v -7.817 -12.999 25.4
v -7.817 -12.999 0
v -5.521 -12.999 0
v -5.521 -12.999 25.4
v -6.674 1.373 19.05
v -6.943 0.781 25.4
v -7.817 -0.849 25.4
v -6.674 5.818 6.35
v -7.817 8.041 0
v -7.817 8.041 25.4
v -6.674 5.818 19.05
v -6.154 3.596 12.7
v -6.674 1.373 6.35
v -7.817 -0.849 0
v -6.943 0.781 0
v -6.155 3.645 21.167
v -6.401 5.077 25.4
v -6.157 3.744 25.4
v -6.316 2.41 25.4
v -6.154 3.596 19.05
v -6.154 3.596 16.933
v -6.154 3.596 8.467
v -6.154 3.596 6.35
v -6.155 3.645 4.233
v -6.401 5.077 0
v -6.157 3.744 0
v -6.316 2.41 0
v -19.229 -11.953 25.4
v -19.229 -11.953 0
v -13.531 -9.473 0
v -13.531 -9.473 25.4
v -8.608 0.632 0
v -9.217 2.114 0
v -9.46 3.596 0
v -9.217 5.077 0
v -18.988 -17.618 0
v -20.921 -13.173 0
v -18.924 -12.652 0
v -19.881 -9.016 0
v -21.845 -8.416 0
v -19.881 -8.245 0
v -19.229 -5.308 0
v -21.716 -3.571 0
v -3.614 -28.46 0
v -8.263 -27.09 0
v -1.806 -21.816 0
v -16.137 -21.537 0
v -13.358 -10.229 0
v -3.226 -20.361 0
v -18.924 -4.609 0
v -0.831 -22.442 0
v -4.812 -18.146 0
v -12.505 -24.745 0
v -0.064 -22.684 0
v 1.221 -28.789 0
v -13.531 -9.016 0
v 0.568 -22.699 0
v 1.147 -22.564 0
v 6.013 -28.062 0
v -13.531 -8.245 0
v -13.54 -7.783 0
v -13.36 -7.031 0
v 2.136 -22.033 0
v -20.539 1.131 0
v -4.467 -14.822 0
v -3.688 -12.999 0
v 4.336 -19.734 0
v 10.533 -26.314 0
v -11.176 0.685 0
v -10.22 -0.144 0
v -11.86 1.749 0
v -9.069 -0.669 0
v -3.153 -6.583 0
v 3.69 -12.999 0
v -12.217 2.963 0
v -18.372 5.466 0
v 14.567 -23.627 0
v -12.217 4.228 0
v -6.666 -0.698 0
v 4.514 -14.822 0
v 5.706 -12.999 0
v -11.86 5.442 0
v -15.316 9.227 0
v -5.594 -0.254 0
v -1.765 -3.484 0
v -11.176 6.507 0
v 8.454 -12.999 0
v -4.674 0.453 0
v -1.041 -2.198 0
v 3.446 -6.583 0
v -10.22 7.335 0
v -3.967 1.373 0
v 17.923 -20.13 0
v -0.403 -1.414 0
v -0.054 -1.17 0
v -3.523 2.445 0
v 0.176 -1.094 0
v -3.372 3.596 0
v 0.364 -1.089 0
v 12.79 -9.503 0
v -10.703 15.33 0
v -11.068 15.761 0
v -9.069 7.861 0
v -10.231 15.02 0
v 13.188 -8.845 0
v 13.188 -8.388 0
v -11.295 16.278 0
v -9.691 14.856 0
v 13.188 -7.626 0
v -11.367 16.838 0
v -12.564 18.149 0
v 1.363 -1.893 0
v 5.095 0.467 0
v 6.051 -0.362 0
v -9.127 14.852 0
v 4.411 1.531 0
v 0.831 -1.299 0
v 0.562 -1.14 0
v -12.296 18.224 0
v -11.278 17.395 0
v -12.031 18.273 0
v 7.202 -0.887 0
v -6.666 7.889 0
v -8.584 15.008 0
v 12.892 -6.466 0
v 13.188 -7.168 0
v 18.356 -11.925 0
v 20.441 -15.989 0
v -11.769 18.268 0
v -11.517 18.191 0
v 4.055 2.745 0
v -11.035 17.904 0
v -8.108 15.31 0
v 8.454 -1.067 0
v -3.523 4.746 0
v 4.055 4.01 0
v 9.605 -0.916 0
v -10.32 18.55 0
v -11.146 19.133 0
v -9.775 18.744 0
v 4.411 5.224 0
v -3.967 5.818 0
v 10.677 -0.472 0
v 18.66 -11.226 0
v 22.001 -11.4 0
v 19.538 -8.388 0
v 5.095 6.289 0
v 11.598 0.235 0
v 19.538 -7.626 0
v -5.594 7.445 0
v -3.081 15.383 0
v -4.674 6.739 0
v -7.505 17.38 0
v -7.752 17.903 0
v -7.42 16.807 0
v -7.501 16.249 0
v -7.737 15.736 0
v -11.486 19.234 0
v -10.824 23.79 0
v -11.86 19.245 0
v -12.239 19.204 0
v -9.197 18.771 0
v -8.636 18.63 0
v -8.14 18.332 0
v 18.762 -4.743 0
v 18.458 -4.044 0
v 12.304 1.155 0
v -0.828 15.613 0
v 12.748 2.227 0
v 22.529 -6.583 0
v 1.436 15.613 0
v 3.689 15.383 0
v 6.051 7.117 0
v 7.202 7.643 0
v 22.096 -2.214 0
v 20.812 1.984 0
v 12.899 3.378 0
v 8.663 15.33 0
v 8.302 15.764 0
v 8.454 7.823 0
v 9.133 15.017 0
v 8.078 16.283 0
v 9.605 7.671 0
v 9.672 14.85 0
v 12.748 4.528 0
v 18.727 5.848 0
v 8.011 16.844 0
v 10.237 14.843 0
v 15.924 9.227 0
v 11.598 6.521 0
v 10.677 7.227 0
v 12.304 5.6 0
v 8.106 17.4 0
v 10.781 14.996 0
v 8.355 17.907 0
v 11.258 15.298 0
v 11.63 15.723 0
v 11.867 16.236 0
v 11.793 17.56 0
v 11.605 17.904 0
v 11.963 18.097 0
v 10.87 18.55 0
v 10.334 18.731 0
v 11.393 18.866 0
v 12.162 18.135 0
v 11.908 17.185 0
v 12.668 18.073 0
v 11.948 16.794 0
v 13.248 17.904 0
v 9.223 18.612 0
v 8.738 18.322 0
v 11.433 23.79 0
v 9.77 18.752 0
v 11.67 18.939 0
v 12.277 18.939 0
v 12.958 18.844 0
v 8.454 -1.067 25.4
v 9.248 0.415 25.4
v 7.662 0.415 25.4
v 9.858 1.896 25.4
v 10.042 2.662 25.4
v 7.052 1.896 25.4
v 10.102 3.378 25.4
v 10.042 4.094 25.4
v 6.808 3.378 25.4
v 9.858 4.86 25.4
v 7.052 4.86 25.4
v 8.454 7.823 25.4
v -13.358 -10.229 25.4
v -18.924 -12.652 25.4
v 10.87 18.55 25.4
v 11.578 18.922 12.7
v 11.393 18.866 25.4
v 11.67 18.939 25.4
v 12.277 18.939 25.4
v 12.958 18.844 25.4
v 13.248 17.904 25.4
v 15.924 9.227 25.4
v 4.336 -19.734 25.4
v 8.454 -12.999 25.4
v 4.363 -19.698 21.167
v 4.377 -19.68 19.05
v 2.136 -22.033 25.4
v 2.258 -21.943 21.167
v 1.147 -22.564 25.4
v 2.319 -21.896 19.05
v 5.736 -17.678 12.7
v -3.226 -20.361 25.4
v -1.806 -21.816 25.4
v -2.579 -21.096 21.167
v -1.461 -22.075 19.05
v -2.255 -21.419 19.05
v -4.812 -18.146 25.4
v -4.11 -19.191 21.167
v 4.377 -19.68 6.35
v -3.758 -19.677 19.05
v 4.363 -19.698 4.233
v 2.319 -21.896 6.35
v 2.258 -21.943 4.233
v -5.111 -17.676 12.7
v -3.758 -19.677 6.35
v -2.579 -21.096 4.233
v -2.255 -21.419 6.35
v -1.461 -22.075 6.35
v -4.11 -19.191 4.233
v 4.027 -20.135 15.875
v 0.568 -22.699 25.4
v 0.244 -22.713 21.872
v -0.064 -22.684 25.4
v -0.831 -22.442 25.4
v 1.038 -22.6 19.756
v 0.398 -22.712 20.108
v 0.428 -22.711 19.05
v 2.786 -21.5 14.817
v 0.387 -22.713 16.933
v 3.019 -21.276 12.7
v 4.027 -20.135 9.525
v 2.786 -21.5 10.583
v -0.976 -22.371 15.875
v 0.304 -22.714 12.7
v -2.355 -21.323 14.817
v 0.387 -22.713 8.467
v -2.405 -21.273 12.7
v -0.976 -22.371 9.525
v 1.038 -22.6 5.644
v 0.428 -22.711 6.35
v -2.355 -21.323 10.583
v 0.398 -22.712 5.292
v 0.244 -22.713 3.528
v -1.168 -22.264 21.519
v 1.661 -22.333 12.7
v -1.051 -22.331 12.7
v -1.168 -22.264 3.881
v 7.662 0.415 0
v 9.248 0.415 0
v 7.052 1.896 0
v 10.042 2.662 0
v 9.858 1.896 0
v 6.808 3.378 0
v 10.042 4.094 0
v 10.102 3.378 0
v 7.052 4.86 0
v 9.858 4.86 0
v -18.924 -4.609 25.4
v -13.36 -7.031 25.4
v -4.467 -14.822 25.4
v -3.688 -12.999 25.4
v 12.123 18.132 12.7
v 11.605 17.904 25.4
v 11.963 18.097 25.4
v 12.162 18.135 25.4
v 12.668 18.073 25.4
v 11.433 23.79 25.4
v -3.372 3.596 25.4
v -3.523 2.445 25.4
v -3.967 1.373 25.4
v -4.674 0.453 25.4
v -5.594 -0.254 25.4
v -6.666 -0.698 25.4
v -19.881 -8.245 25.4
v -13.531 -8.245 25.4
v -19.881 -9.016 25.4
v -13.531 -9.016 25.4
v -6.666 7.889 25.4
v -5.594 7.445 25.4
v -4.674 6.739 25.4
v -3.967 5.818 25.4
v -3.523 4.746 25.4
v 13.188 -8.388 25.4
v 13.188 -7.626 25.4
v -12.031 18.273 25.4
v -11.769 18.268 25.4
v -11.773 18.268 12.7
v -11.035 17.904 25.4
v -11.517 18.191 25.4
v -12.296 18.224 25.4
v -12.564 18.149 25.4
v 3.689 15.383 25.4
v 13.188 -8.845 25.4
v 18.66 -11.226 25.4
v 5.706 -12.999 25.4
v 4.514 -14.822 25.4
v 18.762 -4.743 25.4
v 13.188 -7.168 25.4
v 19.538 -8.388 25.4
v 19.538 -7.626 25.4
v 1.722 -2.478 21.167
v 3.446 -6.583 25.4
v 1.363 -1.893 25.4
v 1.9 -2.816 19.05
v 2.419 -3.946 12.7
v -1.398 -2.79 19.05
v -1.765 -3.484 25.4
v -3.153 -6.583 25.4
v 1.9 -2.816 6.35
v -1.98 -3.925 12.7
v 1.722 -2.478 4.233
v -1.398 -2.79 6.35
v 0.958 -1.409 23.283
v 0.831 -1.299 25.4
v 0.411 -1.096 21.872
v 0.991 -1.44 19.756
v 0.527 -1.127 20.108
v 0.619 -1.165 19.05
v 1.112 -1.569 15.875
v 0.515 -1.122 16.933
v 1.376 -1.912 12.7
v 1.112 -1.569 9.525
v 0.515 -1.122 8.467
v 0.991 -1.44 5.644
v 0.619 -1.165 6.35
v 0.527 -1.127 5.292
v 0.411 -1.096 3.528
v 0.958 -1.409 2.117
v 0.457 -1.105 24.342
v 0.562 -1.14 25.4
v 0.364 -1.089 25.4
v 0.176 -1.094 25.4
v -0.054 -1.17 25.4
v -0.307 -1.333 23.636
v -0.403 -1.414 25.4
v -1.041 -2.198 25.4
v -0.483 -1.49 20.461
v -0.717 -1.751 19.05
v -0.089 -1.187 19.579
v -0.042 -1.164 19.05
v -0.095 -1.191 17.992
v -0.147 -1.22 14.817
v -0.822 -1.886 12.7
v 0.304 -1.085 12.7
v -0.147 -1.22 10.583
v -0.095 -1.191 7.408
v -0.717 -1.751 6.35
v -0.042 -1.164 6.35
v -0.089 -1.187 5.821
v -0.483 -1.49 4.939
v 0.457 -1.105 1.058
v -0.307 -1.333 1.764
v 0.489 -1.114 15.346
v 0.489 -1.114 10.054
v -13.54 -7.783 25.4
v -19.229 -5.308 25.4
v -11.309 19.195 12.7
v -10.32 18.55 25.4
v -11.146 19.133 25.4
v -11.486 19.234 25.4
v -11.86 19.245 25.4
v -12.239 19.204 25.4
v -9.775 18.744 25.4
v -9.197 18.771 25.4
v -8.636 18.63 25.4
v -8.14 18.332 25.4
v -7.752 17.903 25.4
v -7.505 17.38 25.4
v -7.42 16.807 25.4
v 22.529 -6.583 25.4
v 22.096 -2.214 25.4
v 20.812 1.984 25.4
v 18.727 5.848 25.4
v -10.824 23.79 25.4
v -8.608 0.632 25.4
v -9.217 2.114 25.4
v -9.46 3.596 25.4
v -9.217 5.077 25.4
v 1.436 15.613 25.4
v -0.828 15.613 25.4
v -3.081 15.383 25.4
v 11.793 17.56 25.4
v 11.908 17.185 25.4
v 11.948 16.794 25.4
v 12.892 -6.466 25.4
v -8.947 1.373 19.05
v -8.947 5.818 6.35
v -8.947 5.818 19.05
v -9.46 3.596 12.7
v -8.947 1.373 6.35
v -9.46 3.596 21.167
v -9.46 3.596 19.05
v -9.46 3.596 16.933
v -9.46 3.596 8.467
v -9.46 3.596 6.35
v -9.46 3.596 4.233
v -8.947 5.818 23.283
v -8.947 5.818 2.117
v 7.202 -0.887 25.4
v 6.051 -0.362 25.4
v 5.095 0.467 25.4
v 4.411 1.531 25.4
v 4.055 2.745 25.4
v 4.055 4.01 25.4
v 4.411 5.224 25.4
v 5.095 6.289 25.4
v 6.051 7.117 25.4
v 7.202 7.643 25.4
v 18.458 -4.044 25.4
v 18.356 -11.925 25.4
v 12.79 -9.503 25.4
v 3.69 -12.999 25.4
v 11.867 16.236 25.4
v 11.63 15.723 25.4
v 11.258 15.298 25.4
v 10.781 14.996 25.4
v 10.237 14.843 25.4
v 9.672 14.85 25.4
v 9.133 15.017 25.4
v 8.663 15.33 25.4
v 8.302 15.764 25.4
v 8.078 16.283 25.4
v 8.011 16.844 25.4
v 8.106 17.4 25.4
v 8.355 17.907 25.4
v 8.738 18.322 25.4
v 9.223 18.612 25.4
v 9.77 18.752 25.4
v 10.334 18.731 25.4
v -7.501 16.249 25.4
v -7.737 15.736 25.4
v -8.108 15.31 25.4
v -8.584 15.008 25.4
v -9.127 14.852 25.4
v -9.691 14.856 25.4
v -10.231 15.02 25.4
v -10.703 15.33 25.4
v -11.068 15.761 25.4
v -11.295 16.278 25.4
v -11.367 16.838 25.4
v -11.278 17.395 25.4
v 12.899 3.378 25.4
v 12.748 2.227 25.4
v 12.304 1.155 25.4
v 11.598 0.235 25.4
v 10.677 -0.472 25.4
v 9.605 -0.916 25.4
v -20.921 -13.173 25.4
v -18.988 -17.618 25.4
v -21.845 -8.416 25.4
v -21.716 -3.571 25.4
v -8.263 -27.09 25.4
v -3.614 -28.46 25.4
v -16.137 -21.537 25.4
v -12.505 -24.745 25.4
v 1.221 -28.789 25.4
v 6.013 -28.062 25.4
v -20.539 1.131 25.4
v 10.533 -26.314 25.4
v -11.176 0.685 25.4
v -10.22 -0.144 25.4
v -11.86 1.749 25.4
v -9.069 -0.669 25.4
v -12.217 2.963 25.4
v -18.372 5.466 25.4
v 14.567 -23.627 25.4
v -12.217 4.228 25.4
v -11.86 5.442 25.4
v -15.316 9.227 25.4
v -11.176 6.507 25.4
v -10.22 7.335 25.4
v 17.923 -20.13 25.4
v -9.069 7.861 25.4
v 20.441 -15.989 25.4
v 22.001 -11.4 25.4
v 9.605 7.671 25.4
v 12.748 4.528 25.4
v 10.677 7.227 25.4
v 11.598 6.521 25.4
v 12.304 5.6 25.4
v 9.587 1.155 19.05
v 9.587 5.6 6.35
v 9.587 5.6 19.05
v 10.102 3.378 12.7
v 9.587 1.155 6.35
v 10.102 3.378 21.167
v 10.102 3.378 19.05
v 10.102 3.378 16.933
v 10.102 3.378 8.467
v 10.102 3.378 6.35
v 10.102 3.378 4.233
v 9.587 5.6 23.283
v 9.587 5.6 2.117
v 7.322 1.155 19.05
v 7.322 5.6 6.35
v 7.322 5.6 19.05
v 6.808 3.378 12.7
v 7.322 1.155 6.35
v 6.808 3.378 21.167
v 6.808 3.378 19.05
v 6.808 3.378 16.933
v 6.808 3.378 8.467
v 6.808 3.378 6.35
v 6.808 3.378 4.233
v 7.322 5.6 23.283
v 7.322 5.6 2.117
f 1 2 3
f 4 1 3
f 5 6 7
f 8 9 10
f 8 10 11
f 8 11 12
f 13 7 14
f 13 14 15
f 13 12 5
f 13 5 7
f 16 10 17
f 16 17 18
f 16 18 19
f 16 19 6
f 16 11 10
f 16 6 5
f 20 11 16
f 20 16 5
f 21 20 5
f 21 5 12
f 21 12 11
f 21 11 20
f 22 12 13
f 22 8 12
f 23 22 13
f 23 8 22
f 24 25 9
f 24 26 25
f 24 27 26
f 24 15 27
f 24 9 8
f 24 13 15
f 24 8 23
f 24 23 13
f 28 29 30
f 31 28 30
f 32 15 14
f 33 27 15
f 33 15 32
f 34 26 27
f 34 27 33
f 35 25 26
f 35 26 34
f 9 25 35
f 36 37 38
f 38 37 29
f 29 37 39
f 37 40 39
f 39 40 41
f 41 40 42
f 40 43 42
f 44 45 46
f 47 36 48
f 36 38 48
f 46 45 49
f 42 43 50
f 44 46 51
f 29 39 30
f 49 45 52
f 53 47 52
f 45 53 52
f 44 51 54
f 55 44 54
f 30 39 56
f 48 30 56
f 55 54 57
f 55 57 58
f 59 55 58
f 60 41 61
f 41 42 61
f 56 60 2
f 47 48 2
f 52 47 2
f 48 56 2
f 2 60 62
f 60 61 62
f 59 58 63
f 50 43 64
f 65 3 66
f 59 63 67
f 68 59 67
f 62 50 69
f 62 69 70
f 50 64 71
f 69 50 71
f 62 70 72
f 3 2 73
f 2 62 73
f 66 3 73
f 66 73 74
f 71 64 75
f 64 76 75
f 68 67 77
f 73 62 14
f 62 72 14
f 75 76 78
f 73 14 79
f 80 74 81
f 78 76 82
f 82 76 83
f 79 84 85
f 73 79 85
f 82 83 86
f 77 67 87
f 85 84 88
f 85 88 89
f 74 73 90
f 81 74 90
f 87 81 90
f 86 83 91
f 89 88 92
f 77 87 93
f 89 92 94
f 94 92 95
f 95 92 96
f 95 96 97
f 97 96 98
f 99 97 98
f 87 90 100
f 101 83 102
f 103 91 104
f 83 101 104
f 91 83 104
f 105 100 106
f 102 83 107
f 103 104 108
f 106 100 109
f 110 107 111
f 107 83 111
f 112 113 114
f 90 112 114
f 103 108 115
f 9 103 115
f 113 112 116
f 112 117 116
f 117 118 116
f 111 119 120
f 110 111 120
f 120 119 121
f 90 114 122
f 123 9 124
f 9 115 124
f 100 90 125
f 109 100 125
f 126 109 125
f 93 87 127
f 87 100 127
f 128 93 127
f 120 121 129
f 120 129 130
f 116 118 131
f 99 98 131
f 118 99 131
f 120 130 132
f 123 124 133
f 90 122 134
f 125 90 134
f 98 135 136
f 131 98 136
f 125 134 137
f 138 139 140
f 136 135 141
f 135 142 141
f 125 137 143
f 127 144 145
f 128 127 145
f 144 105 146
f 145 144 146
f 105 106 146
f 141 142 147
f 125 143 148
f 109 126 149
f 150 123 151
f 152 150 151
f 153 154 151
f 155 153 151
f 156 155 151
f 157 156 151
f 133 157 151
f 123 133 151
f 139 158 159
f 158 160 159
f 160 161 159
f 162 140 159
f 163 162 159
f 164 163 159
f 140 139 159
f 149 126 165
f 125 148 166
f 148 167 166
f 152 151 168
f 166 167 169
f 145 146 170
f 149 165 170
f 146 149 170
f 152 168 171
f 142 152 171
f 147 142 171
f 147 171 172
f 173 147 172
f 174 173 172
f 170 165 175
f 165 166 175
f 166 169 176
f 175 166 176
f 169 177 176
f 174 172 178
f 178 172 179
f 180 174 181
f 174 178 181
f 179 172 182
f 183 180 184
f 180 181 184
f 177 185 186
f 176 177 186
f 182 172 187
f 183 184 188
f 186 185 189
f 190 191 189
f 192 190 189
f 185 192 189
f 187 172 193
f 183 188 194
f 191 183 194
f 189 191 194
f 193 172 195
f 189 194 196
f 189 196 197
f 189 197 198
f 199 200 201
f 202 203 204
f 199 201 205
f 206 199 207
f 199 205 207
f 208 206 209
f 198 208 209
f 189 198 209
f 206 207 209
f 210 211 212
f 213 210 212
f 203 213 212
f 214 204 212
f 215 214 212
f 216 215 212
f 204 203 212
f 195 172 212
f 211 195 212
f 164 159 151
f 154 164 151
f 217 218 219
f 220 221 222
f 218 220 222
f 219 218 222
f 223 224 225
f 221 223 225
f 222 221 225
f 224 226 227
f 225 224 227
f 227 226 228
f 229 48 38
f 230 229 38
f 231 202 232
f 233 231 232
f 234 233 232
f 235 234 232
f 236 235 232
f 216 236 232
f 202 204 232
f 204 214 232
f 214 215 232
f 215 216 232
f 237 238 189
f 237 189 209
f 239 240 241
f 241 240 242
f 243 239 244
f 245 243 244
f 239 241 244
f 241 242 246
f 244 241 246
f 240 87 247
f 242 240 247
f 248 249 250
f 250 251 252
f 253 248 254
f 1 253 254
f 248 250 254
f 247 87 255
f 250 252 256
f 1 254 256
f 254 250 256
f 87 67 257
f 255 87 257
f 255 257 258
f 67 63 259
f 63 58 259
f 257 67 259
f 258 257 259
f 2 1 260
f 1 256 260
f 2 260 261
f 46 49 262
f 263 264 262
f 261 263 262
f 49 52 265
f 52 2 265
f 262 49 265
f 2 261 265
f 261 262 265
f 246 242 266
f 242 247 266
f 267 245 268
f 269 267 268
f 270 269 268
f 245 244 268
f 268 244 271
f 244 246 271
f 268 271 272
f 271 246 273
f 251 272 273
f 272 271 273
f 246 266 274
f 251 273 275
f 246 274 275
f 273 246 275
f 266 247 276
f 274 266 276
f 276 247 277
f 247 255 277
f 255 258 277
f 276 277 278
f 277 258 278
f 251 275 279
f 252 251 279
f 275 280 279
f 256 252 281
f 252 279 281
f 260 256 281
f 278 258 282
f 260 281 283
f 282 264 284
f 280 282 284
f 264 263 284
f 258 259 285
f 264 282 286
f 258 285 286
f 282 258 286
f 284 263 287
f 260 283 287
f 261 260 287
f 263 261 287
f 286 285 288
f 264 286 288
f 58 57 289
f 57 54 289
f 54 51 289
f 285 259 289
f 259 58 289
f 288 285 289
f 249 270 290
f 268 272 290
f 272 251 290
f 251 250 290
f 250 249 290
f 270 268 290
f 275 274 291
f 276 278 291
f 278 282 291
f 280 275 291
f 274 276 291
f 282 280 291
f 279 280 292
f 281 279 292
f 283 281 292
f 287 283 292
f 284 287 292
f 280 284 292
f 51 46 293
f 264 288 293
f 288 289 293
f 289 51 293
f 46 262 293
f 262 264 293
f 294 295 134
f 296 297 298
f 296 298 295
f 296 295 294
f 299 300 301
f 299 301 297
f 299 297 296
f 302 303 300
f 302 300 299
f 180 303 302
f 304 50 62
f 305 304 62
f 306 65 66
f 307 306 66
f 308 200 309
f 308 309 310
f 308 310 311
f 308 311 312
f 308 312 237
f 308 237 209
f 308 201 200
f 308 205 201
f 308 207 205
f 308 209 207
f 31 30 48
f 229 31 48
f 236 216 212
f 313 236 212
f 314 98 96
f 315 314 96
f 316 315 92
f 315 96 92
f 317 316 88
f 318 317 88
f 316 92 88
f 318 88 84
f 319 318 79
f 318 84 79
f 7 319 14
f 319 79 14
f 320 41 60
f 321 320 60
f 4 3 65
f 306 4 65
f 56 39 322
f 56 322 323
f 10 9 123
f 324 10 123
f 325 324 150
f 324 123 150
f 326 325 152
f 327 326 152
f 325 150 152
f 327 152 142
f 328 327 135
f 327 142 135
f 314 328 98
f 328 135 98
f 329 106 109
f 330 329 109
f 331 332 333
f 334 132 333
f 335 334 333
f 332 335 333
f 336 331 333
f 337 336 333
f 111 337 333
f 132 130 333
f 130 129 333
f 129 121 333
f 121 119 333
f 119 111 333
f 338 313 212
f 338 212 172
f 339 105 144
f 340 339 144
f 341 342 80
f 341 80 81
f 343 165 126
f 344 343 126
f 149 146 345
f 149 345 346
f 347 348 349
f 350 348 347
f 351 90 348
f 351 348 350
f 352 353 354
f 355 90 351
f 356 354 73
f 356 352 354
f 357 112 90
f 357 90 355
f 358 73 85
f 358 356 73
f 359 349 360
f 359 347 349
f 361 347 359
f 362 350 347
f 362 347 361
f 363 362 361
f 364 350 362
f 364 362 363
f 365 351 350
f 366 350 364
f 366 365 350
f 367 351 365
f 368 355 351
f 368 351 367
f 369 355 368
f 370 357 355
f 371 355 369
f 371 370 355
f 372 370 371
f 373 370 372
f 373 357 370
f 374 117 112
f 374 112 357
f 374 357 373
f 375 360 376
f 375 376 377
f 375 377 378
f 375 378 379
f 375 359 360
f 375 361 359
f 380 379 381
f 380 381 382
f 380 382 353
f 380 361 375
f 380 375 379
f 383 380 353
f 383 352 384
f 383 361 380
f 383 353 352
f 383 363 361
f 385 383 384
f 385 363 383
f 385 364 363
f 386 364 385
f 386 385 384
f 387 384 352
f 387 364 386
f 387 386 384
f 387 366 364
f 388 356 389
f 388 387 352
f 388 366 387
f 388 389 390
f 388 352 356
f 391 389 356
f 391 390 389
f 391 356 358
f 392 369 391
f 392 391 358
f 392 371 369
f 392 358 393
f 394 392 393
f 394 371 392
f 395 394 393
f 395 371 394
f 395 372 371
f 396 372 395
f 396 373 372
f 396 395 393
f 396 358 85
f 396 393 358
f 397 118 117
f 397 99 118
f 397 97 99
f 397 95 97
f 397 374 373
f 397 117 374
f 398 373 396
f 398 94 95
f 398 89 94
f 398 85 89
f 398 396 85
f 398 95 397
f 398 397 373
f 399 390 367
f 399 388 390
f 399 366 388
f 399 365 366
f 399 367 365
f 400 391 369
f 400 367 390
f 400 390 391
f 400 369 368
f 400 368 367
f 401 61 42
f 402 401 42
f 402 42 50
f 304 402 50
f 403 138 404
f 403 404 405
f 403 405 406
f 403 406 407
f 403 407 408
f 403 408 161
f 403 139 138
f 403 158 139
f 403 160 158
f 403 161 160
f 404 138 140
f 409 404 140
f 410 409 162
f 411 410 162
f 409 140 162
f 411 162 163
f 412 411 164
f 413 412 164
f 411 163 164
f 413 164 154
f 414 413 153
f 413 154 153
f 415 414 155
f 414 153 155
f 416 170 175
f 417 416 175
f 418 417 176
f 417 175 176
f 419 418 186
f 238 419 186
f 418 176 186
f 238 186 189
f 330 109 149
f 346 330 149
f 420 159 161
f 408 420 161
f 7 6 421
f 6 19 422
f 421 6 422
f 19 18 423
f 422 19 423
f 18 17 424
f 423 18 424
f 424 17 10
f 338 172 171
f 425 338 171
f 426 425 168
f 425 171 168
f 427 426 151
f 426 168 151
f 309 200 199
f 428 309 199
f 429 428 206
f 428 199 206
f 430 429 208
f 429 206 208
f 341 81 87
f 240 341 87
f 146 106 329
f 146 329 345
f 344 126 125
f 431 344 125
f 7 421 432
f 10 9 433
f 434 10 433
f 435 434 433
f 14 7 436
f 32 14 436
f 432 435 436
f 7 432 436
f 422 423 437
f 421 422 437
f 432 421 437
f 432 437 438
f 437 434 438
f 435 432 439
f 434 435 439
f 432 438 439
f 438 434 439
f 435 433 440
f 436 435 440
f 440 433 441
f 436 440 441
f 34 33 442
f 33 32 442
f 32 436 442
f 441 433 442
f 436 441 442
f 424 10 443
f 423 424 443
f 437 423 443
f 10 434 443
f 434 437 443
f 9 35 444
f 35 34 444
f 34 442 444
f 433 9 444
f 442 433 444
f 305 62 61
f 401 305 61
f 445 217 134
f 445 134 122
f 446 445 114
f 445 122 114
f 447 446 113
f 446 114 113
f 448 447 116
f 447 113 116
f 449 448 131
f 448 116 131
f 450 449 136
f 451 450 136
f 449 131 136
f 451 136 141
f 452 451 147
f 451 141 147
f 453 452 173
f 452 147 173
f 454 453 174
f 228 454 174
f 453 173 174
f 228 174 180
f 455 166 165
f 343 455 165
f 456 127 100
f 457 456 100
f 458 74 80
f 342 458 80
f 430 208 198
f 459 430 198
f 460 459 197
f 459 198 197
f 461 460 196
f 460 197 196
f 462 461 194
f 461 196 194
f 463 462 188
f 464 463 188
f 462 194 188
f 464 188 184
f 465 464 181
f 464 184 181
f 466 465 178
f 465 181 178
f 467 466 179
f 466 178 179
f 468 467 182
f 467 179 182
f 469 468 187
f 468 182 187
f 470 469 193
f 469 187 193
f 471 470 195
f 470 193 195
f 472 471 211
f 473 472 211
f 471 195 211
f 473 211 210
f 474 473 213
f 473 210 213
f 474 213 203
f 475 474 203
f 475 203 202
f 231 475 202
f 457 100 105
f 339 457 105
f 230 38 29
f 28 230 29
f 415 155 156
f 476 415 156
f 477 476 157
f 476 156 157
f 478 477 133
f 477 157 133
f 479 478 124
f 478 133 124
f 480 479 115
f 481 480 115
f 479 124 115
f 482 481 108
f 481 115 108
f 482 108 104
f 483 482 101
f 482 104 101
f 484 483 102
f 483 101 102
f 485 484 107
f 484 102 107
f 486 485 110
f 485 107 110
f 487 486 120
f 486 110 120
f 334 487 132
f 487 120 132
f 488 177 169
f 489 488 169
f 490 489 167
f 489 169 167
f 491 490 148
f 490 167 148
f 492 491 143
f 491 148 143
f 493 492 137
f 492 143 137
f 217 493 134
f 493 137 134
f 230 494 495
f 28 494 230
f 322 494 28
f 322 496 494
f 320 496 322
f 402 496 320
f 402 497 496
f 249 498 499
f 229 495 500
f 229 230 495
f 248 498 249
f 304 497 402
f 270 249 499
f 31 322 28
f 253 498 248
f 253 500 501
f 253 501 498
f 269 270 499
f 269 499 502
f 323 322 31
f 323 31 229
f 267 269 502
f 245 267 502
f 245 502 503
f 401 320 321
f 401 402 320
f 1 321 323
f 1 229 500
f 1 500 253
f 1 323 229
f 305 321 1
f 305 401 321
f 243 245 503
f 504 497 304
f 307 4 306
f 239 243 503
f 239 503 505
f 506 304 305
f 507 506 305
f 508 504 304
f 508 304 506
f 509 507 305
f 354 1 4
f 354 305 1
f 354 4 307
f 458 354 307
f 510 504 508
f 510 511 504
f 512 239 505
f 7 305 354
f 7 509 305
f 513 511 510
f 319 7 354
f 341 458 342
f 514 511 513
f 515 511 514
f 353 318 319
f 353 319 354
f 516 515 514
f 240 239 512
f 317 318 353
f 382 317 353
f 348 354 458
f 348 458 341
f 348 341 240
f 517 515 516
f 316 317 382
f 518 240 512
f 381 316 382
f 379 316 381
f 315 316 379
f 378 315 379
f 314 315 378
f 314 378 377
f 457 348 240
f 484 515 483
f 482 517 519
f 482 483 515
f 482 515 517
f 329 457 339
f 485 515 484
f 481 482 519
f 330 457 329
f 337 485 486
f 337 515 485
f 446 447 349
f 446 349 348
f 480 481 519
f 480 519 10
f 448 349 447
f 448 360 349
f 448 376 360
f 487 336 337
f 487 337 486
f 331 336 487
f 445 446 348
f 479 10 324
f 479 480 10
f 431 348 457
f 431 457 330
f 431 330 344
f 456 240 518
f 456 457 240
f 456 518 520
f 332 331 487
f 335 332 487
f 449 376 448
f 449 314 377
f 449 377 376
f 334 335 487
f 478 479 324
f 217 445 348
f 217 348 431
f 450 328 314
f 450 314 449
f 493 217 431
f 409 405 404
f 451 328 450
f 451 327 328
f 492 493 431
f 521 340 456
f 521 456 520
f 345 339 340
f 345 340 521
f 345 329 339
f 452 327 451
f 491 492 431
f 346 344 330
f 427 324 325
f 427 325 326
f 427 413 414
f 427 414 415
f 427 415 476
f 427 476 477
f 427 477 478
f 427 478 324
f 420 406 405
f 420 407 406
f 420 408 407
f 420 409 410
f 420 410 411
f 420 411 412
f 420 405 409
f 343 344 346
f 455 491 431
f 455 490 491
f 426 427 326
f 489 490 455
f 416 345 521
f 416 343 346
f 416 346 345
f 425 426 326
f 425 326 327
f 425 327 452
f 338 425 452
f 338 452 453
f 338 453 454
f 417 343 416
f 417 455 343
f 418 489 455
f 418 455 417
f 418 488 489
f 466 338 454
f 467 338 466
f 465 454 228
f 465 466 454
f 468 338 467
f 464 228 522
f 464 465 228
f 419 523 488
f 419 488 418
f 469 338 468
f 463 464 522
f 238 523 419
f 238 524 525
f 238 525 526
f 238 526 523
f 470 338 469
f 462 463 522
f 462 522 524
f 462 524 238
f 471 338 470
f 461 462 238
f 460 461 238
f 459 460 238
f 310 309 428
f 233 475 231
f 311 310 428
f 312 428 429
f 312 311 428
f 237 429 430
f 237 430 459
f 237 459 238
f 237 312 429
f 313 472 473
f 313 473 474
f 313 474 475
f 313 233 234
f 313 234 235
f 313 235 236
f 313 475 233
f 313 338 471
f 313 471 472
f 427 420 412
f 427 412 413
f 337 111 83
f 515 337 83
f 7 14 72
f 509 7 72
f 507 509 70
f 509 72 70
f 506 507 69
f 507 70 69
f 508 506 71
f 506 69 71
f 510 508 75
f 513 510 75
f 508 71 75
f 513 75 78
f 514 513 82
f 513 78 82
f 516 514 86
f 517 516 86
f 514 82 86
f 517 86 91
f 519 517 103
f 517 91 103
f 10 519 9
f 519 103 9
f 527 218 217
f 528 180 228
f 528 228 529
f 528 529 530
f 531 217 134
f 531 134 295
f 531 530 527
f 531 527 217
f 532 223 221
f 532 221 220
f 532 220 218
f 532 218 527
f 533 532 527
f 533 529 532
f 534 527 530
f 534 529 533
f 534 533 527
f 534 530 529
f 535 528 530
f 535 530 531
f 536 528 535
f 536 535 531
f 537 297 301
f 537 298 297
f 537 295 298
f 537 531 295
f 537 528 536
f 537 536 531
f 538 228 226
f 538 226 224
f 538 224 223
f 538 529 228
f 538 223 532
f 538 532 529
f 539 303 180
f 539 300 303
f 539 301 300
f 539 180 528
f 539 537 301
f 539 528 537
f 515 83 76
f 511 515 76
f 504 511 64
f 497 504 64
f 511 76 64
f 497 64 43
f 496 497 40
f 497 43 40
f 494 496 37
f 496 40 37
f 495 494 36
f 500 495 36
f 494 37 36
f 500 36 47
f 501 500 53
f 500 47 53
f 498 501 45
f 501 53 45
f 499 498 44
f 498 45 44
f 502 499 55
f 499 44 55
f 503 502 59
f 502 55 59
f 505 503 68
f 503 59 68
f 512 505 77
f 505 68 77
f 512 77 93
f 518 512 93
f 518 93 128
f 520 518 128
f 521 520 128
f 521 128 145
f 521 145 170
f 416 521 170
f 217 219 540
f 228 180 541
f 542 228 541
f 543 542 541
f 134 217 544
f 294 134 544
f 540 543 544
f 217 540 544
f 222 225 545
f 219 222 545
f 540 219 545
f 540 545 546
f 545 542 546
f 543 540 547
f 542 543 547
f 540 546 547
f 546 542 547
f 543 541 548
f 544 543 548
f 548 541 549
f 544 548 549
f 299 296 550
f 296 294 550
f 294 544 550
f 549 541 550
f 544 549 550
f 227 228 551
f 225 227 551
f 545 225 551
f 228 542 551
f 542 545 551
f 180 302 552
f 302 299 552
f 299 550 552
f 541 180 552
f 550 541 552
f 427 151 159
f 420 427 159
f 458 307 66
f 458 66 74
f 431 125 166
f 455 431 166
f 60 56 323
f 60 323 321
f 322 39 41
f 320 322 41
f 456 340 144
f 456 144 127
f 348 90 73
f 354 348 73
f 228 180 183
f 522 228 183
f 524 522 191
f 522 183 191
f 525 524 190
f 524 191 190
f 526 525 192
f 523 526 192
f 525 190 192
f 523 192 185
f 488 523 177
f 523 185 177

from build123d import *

# Parameters (mm, degrees)
F0_W     = 6.35
F0_H     = 0.7715476677
F0_H_2   = 0.762
F1_DEPTH = 25.4


with BuildPart() as f1:
    # F0 (on Top) → F1 (new body)
    with BuildSketch(Plane.XY):
        with BuildLine():
            ThreePointArc((3.6893544979, 15.3829226228), (10.2928229209, 13.271137937), (15.92431222, 9.2274072279))
            Line((15.92431222, 9.2274072279), (13.2480858126, 17.904334579))
            add(Edge.make_bspline(
                [(11.6048627637, 17.904334579), (11.759038205, 18.0069718661), (12.1326583039, 18.2556972989), (12.8353575143, 18.0343451232), (13.2480858126, 17.904334579)],
                knots=[0, 0, 0, 0, 0.4126529642, 1, 1, 1, 1], degree=3))
            ThreePointArc((11.6048627637, 17.904334579), (11.8599641167, 17.3752399796), (11.947598812, 16.7944319601))
            ThreePointArc((11.947598812, 16.7944319601), (8.3016366544, 15.7643285867), (10.8695058886, 18.5500422494))
            add(Edge.make_bspline(
                [(10.8695058886, 18.5500422494), (11.0812401289, 18.7052749618), (11.5711304706, 19.064437497), (12.455904644, 18.9238167328), (12.9582728554, 18.8439733061)],
                knots=[0, 0, 0, 0, 0.4322074192, 1, 1, 1, 1], degree=3))
            Line((12.9582728554, 18.8439733061), (11.4326283679, 23.7904555412))
            Line((11.4326283679, 23.7904555412), (3.6893544979, 15.3829226228))
        make_face()
        with BuildLine():
            Line((-12.564187943, 18.1494181327), (-15.316005519, 9.2274072279))
            ThreePointArc((-15.316005519, 9.2274072279), (-9.6845162199, 13.271137937), (-3.0810477969, 15.3829226228))
            Line((-3.0810477969, 15.3829226228), (-10.8243216669, 23.7904555412))
            Line((-10.8243216669, 23.7904555412), (-12.2388683659, 19.2041772995))
            add(Edge.make_bspline(
                [(-10.320267483, 18.5500422494), (-10.6450402853, 18.8216017136), (-11.2573678049, 19.3320321307), (-11.9249159549, 19.2452425689), (-12.2388683659, 19.2041772995)],
                knots=[0, 0, 0, 0, 0.5298854267, 1, 1, 1, 1], degree=3))
            ThreePointArc((-10.320267483, 18.5500422494), (-8.3773722381, 18.4989668664), (-7.4203719968, 16.8073400855))
            ThreePointArc((-7.4203719968, 16.8073400855), (-9.9671672086, 14.9188250457), (-11.0345882749, 17.904334579))
            add(Edge.make_bspline(
                [(-11.0345882749, 17.904334579), (-11.2746678219, 18.0659172243), (-11.7533192818, 18.388514969), (-12.2951988679, 18.2285634232), (-12.564187943, 18.1494181327)],
                knots=[0, 0, 0, 0, 0.503481537, 1, 1, 1, 1], degree=3))
        make_face()
        with BuildLine():
            ThreePointArc((-15.316005519, 9.2274072279), (-8.2630105363, -27.0901773082), (22.5291533505, -6.5827560189))
            ThreePointArc((22.5291533505, -6.5827560189), (20.8115746398, 1.9844078679), (15.92431222, 9.2274072279))
            ThreePointArc((15.92431222, 9.2274072279), (10.2928229209, 13.271137937), (3.6893544979, 15.3829226228))
            ThreePointArc((3.6893544979, 15.3829226228), (0.3041533505, 15.6422439811), (-3.0810477969, 15.3829226228))
            ThreePointArc((-3.0810477969, 15.3829226228), (-9.6845162199, 13.271137937), (-15.316005519, 9.2274072279))
        make_face()
        Polygon((-19.2285237709, -11.9529337805), (-13.530993307, -9.4734483975), (-13.3581133165, -10.2292431305), (-18.9244574609, -12.6516380664), align=None, mode=Mode.SUBTRACT)
        with Locations((-16.705993307, -8.6304745637)):
            Rectangle(F0_W, F0_H, mode=Mode.SUBTRACT)
        Polygon((-13.3601024399, -7.0305023596), (-13.5401906446, -7.7831600793), (-19.2285237709, -5.3076818185), (-18.9244579329, -4.6089773272), align=None, mode=Mode.SUBTRACT)
        with BuildLine():
            add(Edge.make_bspline(
                [(8.4544904778, -12.9991904411), (5.7358208401, -17.8578443896), (0.3000622257, -27.57146065), (-5.1112893382, -17.8553828418), (-7.8169170707, -12.9991904411)],
                knots=[0, 0, 0, 0, 0.5001853617, 1, 1, 1, 1], degree=3))
            Line((-7.8169170707, -12.9991904411), (-5.5212693537, -12.9991904411))
            Line((-5.5212693537, -12.9991904411), (-4.4673004436, -14.8217486727))
            Line((-4.4673004436, -14.8217486727), (-3.6882793779, -12.9991904411))
            Line((-3.6882793779, -12.9991904411), (3.6895039243, -12.9991904411))
            Line((3.6895039243, -12.9991904411), (4.5143493203, -14.8217486727))
            Line((4.5143493203, -14.8217486727), (5.7057926183, -12.9991904411))
            Line((5.7057926183, -12.9991904411), (8.4544904778, -12.9991904411))
        make_face(mode=Mode.SUBTRACT)
        Polygon((12.7897234634, -9.5025505871), (13.187948443, -8.8448228342), (18.6601339178, -11.2262412371), (18.3560676078, -11.924945523), align=None, mode=Mode.SUBTRACT)
        with Locations((16.362948443, -8.0066228342)):
            Rectangle(F0_W, F0_H_2, mode=Mode.SUBTRACT)
        Polygon((18.7621455003, -4.7426104207), (13.187948443, -7.1684228342), (12.8917350459, -6.4663010707), (18.4580791904, -4.0439061348), align=None, mode=Mode.SUBTRACT)
        with BuildLine():
            ThreePointArc((-7.8169170707, 8.0406948277), (-4.6738274283, 6.73878447), (-3.3719170707, 3.5956948277))
            ThreePointArc((-3.3719170707, 3.5956948277), (-4.6738274283, 0.4526051853), (-7.8169170707, -0.8493051723))
            ThreePointArc((-7.8169170707, -0.8493051723), (-12.2619170707, 3.5956948277), (-7.8169170707, 8.0406948277))
        make_face(mode=Mode.SUBTRACT)
        with BuildLine():
            Line((3.4461712216, -6.5827560189), (-3.1525917134, -6.5827560189))
            add(Edge.make_bspline(
                [(3.4461712216, -6.5827560189), (2.4213029787, -3.8452513416), (0.3585470951, 1.664533861), (-1.9772977638, -3.8221161168), (-3.1525917134, -6.5827560189)],
                knots=[0, 0, 0, 0, 0.4968441739, 1, 1, 1, 1], degree=3))
        make_face(mode=Mode.SUBTRACT)
        with BuildLine():
            ThreePointArc((8.4544904778, 7.8228717559), (11.5975801201, 6.5209613983), (12.8994904778, 3.3778717559))
            ThreePointArc((12.8994904778, 3.3778717559), (11.5975801201, 0.2347821136), (8.4544904778, -1.0671282441))
            ThreePointArc((8.4544904778, -1.0671282441), (4.0094904778, 3.3778717559), (8.4544904778, 7.8228717559))
        make_face(mode=Mode.SUBTRACT)
    extrude(amount=F1_DEPTH)


with BuildPart() as f1b:
    # F0 (on Top) → F1, piece 2 (new body)
    with BuildSketch(Plane.XY):
        with BuildLine():
            add(Edge.make_bspline(
                [(-7.8169170707, 8.0406948277), (-6.9856051326, 6.559028161), (-5.3229812563, 3.5956948277), (-6.9856051326, 0.6323614943), (-7.8169170707, -0.8493051723)],
                knots=[0, 0, 0, 0, 0.5, 1, 1, 1, 1], degree=3))
            add(Edge.make_bspline(
                [(-7.8169170707, 8.0406948277), (-8.6386170054, 6.559028161), (-10.2820168748, 3.5956948277), (-8.6386170054, 0.6323614943), (-7.8169170707, -0.8493051723)],
                knots=[0, 0, 0, 0, 0.5, 1, 1, 1, 1], degree=3))
        make_face()
    extrude(amount=F1_DEPTH)


with BuildPart() as f1c:
    # F0 (on Top) → F1, piece 3 (new body)
    with BuildSketch(Plane.XY):
        with BuildLine():
            add(Edge.make_bspline(
                [(8.4544904778, 7.8228717559), (9.2783947599, 6.3412050893), (10.9262033242, 3.3778717559), (9.2783947599, 0.4145384226), (8.4544904778, -1.0671282441)],
                knots=[0, 0, 0, 0, 0.5, 1, 1, 1, 1], degree=3))
            add(Edge.make_bspline(
                [(8.4544904778, 7.8228717559), (7.6310723212, 6.3412050893), (5.9842360082, 3.3778717559), (7.6310723212, 0.4145384226), (8.4544904778, -1.0671282441)],
                knots=[0, 0, 0, 0, 0.5, 1, 1, 1, 1], degree=3))
        make_face()
    extrude(amount=F1_DEPTH)


solid = Compound([f1.part, f1b.part, f1c.part])
